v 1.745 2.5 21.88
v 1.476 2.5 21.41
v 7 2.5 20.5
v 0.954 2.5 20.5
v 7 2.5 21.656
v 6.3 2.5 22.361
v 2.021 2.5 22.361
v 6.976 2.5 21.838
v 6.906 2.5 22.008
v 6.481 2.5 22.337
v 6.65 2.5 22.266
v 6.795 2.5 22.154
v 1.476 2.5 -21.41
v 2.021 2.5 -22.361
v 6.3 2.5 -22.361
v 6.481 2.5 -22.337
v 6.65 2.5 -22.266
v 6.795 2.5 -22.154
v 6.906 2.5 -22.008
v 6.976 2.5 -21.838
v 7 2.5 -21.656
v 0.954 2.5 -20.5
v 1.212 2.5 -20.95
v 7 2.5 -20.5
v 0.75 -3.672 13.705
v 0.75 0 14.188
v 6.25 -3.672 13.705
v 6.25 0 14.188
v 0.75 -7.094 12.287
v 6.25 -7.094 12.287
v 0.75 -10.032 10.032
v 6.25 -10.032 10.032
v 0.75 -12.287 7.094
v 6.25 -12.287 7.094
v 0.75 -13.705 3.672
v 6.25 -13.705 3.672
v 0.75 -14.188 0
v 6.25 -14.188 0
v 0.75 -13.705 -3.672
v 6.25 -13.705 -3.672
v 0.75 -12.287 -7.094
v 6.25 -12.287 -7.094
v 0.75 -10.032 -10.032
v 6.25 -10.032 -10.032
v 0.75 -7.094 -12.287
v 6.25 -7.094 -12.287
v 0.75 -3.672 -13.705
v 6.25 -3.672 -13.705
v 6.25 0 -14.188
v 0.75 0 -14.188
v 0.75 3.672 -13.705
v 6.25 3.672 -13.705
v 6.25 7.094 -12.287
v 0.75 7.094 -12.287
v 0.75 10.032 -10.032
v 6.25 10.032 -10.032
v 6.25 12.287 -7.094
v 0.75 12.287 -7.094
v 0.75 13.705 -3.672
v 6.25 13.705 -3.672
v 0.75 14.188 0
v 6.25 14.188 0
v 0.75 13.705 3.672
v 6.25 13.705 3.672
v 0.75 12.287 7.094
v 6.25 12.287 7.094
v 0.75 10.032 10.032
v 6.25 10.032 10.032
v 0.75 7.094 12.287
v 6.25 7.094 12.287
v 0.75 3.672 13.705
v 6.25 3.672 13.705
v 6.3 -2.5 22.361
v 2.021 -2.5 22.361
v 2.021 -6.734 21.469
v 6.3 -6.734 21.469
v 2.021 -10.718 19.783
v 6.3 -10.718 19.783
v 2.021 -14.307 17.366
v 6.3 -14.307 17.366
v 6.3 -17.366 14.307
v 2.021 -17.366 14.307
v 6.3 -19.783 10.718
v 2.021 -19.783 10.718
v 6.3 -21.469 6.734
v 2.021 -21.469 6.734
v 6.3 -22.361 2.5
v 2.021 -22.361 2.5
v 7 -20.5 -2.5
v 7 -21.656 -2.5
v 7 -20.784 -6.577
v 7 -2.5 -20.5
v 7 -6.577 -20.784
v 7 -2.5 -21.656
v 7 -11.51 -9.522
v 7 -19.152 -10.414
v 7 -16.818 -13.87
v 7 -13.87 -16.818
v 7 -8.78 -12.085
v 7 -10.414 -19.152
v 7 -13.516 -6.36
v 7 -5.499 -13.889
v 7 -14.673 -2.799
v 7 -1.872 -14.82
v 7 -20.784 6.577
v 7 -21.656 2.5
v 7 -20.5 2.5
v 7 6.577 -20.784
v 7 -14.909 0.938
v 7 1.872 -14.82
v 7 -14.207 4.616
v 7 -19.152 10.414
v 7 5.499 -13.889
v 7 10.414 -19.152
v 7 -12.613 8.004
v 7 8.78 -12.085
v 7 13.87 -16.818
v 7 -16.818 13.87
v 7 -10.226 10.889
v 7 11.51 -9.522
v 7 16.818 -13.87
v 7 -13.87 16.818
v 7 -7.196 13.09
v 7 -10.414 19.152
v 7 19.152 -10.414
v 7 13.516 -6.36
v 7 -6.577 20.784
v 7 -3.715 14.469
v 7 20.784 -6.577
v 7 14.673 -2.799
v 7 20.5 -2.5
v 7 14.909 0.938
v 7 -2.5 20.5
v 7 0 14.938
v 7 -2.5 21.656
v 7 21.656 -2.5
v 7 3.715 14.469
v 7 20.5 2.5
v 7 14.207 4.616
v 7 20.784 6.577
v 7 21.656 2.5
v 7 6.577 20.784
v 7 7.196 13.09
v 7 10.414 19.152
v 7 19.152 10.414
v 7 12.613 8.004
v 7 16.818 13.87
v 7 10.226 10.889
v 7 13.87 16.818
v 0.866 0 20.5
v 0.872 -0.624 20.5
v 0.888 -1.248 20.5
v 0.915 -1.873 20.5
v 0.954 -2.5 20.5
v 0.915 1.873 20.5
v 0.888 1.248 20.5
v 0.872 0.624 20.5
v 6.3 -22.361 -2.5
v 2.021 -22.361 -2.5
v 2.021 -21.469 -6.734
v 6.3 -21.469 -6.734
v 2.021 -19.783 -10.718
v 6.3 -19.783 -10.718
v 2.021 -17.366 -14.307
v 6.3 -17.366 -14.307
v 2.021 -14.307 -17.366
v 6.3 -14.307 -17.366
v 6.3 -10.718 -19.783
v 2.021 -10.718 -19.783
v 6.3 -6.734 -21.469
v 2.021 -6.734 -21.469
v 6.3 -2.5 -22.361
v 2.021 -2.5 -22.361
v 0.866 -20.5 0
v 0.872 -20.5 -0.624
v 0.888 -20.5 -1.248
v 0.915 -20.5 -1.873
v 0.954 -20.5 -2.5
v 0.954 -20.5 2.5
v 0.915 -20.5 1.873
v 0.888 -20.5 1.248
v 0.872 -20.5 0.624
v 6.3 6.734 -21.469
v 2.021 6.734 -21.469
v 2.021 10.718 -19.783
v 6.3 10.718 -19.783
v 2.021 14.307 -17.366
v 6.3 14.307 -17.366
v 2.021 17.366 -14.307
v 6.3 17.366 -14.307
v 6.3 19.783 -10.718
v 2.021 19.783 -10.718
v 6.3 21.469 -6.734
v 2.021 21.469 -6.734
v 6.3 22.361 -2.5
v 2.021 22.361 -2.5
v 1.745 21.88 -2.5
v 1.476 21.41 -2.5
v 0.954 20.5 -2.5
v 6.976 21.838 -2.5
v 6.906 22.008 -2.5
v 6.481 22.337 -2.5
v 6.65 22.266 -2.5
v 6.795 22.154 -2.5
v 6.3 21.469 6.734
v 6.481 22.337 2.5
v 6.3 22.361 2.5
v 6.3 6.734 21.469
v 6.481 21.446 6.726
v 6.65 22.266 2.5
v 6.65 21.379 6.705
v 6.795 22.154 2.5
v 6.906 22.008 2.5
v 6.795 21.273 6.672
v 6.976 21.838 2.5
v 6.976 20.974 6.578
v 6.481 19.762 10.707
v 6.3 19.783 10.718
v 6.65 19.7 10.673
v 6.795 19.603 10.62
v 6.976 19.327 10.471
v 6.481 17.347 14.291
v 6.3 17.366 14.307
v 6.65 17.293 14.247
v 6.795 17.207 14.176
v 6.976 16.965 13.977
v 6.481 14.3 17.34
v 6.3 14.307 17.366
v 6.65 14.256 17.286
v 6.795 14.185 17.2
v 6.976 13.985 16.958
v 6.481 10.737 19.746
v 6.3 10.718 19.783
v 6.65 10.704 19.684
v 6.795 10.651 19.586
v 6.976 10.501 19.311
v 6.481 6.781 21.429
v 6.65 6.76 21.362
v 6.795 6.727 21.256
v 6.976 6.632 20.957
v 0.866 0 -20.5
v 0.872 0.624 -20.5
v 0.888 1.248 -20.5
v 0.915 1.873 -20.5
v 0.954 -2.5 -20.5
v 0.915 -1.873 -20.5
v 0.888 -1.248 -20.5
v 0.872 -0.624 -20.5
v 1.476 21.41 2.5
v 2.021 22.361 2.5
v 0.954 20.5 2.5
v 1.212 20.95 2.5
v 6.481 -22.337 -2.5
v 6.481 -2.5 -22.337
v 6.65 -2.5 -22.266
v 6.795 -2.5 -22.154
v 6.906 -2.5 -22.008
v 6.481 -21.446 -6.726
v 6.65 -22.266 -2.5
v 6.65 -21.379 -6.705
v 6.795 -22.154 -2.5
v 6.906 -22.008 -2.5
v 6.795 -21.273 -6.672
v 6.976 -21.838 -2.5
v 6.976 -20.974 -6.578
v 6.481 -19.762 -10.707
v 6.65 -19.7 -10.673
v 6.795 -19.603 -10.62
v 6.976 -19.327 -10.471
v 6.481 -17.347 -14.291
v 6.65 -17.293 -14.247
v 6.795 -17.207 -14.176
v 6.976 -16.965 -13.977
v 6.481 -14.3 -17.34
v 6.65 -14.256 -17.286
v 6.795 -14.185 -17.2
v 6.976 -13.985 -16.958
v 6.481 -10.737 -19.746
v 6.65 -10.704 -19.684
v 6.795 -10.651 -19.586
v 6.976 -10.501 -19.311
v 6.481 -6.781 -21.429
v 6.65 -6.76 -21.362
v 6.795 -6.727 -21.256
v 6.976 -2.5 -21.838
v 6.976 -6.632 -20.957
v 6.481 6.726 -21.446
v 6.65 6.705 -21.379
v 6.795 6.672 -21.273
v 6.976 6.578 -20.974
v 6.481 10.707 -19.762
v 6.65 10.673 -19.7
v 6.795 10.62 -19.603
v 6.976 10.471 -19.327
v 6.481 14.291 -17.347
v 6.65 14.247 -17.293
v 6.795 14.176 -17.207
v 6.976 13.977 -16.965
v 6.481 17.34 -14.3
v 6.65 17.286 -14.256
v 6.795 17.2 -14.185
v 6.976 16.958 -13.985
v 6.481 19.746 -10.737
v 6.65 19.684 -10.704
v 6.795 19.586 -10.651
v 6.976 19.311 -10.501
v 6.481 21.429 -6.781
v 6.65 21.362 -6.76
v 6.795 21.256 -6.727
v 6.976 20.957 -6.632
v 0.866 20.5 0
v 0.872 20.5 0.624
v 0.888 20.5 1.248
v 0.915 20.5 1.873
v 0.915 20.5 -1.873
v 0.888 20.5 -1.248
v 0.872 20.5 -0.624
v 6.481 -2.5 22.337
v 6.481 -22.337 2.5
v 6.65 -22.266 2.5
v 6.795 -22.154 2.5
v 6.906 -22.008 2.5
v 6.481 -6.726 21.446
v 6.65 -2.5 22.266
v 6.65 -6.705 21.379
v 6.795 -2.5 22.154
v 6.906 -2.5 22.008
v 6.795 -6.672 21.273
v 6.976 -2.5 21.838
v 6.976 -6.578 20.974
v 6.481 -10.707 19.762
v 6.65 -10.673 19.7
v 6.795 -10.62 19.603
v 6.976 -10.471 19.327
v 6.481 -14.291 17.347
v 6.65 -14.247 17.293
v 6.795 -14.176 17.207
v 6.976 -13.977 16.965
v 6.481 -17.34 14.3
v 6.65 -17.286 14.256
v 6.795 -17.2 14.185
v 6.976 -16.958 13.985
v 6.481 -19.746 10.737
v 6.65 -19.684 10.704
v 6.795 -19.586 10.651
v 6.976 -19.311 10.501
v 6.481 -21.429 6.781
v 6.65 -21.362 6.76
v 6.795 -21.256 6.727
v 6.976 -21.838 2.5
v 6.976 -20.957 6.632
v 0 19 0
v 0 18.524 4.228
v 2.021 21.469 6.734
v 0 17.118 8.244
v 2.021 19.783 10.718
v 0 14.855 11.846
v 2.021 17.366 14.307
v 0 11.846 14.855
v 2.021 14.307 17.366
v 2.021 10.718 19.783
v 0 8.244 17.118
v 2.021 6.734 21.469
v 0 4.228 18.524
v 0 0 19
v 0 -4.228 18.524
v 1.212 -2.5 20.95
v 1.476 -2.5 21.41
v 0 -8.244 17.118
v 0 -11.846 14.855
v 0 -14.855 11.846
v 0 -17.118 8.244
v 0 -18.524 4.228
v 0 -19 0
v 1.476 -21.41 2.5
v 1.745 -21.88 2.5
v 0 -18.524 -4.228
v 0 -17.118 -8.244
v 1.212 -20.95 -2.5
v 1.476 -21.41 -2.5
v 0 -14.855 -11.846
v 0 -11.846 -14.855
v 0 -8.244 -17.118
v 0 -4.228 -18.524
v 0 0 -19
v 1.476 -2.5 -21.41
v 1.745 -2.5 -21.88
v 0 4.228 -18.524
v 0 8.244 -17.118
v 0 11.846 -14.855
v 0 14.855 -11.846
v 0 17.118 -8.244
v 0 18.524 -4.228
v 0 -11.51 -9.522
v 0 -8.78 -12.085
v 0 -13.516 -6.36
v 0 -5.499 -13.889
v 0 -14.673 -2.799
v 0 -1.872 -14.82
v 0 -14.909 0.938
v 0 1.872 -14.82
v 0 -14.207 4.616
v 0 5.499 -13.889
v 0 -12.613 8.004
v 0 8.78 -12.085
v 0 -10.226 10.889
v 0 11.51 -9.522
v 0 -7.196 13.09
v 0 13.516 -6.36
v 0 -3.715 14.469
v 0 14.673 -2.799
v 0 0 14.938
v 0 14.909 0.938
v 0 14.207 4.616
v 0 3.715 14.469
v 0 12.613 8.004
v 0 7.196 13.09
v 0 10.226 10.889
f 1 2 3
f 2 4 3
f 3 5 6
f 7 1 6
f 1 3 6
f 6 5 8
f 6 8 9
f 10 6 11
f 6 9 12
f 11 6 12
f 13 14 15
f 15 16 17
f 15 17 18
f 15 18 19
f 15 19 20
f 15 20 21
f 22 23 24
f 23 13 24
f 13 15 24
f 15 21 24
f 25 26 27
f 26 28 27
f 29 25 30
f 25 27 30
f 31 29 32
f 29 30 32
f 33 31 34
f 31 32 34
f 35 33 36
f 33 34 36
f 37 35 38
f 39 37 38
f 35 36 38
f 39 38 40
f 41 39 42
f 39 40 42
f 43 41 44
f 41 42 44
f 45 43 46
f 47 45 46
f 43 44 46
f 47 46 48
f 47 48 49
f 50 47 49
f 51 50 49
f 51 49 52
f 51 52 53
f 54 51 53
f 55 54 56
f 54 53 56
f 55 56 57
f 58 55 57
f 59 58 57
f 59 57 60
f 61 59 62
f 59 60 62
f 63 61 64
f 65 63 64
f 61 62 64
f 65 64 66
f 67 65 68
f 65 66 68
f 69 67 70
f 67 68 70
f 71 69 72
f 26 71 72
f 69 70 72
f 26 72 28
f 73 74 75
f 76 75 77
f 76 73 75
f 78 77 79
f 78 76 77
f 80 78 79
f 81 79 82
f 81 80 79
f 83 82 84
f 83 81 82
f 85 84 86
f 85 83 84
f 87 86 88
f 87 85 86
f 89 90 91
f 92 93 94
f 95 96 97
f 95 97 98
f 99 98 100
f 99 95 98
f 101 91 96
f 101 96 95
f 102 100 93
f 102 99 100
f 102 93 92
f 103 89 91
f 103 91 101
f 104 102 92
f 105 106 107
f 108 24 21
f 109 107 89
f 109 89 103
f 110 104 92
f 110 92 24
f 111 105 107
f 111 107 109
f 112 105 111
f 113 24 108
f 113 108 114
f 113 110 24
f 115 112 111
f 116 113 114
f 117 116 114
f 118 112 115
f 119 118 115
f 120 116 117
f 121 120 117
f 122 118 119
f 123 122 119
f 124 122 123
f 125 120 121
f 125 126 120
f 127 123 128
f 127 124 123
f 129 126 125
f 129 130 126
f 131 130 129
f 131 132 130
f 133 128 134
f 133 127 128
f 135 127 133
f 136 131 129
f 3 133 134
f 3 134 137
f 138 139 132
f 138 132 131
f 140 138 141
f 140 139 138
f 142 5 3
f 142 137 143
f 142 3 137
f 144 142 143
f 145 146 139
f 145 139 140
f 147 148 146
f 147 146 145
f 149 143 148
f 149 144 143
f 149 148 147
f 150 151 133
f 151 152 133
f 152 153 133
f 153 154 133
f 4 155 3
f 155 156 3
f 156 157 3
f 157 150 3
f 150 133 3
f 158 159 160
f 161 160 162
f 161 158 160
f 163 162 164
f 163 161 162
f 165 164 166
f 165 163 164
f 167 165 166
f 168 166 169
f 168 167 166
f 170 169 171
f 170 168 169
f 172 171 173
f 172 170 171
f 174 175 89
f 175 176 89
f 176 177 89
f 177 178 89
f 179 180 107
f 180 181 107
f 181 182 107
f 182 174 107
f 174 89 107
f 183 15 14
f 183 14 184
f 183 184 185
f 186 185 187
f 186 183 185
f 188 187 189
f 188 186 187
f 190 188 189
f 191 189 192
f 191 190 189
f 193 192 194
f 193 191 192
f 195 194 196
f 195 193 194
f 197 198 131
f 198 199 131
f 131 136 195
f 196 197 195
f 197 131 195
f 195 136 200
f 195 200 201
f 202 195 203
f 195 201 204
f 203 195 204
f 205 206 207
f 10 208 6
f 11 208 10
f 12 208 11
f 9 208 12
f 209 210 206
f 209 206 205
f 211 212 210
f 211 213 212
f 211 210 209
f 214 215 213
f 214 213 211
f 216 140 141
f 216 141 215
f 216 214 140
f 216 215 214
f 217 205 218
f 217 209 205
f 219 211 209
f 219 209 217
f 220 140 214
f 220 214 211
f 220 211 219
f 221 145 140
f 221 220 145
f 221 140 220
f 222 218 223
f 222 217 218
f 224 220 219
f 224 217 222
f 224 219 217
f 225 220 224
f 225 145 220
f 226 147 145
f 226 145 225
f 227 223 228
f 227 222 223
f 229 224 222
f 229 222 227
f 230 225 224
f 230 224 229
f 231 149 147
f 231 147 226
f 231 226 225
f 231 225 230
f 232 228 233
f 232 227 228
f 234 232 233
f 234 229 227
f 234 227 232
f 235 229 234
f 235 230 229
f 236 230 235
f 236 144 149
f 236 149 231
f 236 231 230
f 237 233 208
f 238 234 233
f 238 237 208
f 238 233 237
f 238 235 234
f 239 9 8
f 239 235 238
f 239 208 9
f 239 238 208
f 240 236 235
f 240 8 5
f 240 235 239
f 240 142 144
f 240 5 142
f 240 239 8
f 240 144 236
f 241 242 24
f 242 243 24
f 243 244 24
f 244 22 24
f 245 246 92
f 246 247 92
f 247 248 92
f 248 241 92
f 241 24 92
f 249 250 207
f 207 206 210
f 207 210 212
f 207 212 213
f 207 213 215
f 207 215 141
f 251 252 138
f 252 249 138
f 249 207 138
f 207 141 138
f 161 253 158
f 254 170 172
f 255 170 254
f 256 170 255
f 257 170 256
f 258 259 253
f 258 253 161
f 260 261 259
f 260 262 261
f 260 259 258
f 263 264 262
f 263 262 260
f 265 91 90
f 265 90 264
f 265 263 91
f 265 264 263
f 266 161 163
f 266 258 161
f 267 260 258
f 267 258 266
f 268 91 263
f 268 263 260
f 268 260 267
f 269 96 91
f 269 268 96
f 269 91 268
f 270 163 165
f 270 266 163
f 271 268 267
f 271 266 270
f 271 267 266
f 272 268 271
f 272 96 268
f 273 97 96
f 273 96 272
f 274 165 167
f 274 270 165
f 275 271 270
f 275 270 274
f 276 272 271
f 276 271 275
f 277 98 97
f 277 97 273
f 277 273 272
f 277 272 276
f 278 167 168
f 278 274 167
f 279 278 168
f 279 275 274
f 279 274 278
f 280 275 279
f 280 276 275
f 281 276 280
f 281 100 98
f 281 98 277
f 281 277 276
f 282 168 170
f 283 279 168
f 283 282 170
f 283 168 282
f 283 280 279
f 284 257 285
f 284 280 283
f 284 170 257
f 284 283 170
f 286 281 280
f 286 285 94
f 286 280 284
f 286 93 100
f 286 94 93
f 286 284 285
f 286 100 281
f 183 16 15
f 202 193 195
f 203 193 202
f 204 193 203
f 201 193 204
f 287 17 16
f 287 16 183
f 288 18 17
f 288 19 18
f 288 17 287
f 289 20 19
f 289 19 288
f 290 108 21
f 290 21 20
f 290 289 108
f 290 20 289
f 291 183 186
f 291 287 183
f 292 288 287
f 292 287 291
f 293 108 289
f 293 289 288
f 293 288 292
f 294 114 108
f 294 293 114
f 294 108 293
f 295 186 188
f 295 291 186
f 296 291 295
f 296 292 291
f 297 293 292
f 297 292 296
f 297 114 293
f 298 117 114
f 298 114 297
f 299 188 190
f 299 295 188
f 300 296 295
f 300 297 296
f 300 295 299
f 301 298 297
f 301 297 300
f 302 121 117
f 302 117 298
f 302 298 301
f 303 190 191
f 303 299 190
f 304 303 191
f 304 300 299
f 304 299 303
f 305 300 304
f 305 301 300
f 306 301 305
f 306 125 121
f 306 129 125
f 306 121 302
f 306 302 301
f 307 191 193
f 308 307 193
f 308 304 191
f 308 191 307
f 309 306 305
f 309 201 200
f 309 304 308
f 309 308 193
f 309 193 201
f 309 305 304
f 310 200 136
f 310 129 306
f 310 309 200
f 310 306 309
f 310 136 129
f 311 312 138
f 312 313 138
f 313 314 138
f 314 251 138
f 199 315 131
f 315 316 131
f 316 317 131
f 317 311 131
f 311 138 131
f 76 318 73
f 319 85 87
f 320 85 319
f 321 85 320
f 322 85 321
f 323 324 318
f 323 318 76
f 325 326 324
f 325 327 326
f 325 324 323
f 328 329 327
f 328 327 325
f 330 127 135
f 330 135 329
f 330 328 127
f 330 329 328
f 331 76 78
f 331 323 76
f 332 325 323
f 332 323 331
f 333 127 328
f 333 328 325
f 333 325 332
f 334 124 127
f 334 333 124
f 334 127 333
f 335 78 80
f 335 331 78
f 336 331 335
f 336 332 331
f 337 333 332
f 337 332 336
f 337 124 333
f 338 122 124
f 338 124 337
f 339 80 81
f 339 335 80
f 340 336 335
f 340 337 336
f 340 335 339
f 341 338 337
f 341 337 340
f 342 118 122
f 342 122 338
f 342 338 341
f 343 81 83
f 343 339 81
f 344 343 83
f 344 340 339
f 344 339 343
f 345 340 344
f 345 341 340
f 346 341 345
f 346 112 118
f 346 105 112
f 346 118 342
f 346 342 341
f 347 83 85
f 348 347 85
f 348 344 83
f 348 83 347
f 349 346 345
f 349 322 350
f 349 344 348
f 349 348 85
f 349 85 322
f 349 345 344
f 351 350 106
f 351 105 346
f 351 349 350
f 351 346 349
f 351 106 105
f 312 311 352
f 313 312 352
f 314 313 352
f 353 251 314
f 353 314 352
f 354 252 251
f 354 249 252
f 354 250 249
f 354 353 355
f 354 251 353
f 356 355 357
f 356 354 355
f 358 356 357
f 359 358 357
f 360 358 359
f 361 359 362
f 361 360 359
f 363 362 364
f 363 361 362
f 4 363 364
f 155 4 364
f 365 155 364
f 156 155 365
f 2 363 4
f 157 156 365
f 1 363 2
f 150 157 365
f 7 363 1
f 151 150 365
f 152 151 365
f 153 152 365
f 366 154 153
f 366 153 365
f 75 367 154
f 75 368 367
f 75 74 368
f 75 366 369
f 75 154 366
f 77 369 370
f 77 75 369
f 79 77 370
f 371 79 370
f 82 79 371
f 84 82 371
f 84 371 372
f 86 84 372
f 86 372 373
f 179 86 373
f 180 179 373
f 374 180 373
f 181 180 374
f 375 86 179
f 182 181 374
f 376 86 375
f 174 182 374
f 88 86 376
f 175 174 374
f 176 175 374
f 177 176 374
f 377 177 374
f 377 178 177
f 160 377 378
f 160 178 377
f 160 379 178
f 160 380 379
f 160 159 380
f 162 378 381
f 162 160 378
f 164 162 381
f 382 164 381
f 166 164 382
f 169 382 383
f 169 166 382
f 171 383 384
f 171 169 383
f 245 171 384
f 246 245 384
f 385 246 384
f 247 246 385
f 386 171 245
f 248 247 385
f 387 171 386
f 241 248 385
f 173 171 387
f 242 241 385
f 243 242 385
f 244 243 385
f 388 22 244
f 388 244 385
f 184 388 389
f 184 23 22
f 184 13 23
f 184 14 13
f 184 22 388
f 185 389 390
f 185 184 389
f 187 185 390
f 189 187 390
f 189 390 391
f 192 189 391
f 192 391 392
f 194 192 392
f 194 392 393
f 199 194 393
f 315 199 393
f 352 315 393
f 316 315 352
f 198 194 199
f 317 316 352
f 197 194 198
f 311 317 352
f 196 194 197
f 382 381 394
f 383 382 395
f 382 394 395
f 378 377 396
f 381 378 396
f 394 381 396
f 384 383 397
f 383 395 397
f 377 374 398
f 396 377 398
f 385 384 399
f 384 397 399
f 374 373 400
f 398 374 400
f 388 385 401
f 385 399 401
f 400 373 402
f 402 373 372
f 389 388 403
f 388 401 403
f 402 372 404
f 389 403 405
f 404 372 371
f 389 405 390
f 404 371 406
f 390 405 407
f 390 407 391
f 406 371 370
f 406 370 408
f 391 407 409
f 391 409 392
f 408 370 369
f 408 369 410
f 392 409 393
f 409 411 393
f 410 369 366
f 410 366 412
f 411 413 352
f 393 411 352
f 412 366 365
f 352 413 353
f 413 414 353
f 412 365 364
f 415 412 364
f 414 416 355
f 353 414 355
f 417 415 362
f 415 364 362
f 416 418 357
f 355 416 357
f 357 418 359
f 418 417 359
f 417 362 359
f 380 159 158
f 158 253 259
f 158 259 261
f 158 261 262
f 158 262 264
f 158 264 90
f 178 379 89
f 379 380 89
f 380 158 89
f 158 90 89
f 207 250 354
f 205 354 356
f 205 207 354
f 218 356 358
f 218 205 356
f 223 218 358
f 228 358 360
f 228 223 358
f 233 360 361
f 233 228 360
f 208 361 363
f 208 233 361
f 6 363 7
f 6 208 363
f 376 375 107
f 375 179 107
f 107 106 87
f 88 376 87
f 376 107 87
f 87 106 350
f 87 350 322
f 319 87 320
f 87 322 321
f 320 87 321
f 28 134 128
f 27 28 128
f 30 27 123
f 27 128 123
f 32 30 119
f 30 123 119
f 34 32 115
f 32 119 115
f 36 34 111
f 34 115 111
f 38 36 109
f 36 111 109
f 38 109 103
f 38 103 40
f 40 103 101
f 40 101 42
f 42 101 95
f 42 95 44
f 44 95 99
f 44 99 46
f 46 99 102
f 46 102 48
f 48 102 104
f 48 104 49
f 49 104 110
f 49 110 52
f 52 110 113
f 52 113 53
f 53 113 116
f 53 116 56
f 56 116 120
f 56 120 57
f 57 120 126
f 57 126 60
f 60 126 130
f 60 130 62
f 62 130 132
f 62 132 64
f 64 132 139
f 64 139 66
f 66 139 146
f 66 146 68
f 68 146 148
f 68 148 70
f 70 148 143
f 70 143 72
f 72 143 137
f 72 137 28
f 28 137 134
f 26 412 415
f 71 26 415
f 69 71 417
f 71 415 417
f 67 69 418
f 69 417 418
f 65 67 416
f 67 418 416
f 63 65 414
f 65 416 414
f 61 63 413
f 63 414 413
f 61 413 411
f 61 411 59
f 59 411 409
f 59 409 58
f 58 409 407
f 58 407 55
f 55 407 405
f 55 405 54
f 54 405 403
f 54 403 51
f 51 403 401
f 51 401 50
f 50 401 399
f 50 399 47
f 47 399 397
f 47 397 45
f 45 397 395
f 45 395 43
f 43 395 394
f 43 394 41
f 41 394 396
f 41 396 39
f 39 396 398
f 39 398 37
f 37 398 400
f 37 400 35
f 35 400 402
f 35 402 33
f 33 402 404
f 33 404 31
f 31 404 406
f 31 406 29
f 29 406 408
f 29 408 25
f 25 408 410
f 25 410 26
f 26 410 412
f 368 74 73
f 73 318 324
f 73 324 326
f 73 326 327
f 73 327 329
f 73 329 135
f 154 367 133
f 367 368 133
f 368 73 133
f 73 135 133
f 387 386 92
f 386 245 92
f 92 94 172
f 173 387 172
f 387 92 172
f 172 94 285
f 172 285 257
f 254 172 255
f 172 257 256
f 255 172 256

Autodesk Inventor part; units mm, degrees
ref_plane "YZ Plane" through (0, 0, 0) normal (1, 0, 0) x (0, 1, 0)
ref_plane "XZ Plane" through (0, 0, 0) normal (0, 1, 0) x (-1, 0, 0)
sketch "Sketch1" plane through (0, 0, 0) normal (0, 0, 1) x (1, 0, 0)
  line L0 (0, 0) -> (7, 0)
  line L1 (0, 0) -> (0, 22.5)
  line L2 (0, 22.5) -> (7, 22.5)
  line L3 (7, 22.5) -> (7, 0)
  line L4 (0, 27) -> (0, -4.5) projected
  line L5 (-1.4, 0) -> (8.4, 0) projected
  dimension "d1" = 45
  dimension "d2" = 7
revolve "Body" add sketch "Sketch1" angle 360 about axis through (0, 0, 0) along (1, 0, 0)
sketch "Sketch2" plane through (0, 0, 0) normal (-1, 0, 0) x (0, 0, 1)
  circle A0 centre (0, 0) radius 22.5 projected
  point P0 (0, 0)
hole "Thread" at (0, 0, 0) direction (1, 0, 0) diameter 28.376 end through all thread size "M30x1.5" class "6H" standard "ANSI Metric M Profile"
chamfer "Chamfer1" distance 3.5 angle 30 1 edges at (0, -22.5, 0) measured on face at (0, 19.4769, -2.3649)
sketch "Sketch3" plane through (7, 0, 0) normal (1, 0, 0) x (0, 0, -1)
  circle A0 centre (0, 0) radius 22.5 projected
  line L0 (-2.5, 22.3607) -> (-2.5, 20.5)
  line L1 (-2.5, 20.5) -> (2.5, 20.5)
  line L2 (2.5, 20.5) -> (2.5, 22.3607)
  line L3 (0, -31.5) -> (0, 31.5) projected
  line L4 (-31.5, 0) -> (31.5, 0) projected
  dimension "d12" = 2.5
  dimension "d13" = 2.5
  dimension "d14" = 20.5
extrude "Groove1" cut sketch "Sketch3" against normal through all contours L2 L1 L3 A0 | L3 L1 L0 A0
pattern_circular "Grooves1" count 4 over 360 about axis through (-10, 0, 0) along (1, 0, 0) of "Groove1"
fillet "Fillet1" radius 0.7 4 edges at (7, 15.9099, 15.9099) (7, 15.9099, -15.9099) (7, -15.9099, -15.9099) (7, -15.9099, 15.9099)
chamfer "Chamfer2" distance 0.75 angle 45 1 edges at (7, 0, -14.188) measured on face at (7, 17.4258, 7.9613)
chamfer "Chamfer3" distance 0.75 angle 45 1 edges at (0, 0, -14.188) measured on face at (0, 17.1775, -2.0857)
ref_plane "Work Plane1" through (64.0234, 0, 0) normal (0, 1, 0) x (-1, 0, 0)
equation "\"d1\" = SD2"
equation "\"d2\" = KOH"
equation "\"d12\" = 0.5 * SNB"
equation "\"d13\" = 0.5 * SNB"
equation "\"d14\" = 0.5 * SD2 - SNT"
equation "\"d10\" = -0.5 * LADI + 0.5 * SD2"
equation "\"d11\" = FAWI2"
equation "\"d40\" = -0.5 * LADI + 0.5 * SD2"
equation "\"d18\" = RR"
equation "\"d19\" = 0.025 * NND"
equation "\"d41\" = 0.025 * NND"
equation "\"d21\" = 0.025 * NND"
equation "\"d42\" = 0.025 * NND"
equation "\"KOH\" = 7"
equation "\"SD2\" = 45"
equation "\"SNB\" = 5"
equation "\"SNT\" = 2"
equation "\"LADI\" = 38"
equation "\"RR\" = 0.1 * KOH"
equation "\"FAWI2\" = 30deg"
equation "\"GUL\" = 0.541266 * PTC"
equation "\"TOA\" = 30deg"
equation "\"PTC\" = 1.5"
equation "\"GAL\" = 0.541266 * PTC"
equation "\"NND\" = 30"
properties part number "ANSI/AFBMA Std 8.1 - KM 6" material "Steel, Mild"
